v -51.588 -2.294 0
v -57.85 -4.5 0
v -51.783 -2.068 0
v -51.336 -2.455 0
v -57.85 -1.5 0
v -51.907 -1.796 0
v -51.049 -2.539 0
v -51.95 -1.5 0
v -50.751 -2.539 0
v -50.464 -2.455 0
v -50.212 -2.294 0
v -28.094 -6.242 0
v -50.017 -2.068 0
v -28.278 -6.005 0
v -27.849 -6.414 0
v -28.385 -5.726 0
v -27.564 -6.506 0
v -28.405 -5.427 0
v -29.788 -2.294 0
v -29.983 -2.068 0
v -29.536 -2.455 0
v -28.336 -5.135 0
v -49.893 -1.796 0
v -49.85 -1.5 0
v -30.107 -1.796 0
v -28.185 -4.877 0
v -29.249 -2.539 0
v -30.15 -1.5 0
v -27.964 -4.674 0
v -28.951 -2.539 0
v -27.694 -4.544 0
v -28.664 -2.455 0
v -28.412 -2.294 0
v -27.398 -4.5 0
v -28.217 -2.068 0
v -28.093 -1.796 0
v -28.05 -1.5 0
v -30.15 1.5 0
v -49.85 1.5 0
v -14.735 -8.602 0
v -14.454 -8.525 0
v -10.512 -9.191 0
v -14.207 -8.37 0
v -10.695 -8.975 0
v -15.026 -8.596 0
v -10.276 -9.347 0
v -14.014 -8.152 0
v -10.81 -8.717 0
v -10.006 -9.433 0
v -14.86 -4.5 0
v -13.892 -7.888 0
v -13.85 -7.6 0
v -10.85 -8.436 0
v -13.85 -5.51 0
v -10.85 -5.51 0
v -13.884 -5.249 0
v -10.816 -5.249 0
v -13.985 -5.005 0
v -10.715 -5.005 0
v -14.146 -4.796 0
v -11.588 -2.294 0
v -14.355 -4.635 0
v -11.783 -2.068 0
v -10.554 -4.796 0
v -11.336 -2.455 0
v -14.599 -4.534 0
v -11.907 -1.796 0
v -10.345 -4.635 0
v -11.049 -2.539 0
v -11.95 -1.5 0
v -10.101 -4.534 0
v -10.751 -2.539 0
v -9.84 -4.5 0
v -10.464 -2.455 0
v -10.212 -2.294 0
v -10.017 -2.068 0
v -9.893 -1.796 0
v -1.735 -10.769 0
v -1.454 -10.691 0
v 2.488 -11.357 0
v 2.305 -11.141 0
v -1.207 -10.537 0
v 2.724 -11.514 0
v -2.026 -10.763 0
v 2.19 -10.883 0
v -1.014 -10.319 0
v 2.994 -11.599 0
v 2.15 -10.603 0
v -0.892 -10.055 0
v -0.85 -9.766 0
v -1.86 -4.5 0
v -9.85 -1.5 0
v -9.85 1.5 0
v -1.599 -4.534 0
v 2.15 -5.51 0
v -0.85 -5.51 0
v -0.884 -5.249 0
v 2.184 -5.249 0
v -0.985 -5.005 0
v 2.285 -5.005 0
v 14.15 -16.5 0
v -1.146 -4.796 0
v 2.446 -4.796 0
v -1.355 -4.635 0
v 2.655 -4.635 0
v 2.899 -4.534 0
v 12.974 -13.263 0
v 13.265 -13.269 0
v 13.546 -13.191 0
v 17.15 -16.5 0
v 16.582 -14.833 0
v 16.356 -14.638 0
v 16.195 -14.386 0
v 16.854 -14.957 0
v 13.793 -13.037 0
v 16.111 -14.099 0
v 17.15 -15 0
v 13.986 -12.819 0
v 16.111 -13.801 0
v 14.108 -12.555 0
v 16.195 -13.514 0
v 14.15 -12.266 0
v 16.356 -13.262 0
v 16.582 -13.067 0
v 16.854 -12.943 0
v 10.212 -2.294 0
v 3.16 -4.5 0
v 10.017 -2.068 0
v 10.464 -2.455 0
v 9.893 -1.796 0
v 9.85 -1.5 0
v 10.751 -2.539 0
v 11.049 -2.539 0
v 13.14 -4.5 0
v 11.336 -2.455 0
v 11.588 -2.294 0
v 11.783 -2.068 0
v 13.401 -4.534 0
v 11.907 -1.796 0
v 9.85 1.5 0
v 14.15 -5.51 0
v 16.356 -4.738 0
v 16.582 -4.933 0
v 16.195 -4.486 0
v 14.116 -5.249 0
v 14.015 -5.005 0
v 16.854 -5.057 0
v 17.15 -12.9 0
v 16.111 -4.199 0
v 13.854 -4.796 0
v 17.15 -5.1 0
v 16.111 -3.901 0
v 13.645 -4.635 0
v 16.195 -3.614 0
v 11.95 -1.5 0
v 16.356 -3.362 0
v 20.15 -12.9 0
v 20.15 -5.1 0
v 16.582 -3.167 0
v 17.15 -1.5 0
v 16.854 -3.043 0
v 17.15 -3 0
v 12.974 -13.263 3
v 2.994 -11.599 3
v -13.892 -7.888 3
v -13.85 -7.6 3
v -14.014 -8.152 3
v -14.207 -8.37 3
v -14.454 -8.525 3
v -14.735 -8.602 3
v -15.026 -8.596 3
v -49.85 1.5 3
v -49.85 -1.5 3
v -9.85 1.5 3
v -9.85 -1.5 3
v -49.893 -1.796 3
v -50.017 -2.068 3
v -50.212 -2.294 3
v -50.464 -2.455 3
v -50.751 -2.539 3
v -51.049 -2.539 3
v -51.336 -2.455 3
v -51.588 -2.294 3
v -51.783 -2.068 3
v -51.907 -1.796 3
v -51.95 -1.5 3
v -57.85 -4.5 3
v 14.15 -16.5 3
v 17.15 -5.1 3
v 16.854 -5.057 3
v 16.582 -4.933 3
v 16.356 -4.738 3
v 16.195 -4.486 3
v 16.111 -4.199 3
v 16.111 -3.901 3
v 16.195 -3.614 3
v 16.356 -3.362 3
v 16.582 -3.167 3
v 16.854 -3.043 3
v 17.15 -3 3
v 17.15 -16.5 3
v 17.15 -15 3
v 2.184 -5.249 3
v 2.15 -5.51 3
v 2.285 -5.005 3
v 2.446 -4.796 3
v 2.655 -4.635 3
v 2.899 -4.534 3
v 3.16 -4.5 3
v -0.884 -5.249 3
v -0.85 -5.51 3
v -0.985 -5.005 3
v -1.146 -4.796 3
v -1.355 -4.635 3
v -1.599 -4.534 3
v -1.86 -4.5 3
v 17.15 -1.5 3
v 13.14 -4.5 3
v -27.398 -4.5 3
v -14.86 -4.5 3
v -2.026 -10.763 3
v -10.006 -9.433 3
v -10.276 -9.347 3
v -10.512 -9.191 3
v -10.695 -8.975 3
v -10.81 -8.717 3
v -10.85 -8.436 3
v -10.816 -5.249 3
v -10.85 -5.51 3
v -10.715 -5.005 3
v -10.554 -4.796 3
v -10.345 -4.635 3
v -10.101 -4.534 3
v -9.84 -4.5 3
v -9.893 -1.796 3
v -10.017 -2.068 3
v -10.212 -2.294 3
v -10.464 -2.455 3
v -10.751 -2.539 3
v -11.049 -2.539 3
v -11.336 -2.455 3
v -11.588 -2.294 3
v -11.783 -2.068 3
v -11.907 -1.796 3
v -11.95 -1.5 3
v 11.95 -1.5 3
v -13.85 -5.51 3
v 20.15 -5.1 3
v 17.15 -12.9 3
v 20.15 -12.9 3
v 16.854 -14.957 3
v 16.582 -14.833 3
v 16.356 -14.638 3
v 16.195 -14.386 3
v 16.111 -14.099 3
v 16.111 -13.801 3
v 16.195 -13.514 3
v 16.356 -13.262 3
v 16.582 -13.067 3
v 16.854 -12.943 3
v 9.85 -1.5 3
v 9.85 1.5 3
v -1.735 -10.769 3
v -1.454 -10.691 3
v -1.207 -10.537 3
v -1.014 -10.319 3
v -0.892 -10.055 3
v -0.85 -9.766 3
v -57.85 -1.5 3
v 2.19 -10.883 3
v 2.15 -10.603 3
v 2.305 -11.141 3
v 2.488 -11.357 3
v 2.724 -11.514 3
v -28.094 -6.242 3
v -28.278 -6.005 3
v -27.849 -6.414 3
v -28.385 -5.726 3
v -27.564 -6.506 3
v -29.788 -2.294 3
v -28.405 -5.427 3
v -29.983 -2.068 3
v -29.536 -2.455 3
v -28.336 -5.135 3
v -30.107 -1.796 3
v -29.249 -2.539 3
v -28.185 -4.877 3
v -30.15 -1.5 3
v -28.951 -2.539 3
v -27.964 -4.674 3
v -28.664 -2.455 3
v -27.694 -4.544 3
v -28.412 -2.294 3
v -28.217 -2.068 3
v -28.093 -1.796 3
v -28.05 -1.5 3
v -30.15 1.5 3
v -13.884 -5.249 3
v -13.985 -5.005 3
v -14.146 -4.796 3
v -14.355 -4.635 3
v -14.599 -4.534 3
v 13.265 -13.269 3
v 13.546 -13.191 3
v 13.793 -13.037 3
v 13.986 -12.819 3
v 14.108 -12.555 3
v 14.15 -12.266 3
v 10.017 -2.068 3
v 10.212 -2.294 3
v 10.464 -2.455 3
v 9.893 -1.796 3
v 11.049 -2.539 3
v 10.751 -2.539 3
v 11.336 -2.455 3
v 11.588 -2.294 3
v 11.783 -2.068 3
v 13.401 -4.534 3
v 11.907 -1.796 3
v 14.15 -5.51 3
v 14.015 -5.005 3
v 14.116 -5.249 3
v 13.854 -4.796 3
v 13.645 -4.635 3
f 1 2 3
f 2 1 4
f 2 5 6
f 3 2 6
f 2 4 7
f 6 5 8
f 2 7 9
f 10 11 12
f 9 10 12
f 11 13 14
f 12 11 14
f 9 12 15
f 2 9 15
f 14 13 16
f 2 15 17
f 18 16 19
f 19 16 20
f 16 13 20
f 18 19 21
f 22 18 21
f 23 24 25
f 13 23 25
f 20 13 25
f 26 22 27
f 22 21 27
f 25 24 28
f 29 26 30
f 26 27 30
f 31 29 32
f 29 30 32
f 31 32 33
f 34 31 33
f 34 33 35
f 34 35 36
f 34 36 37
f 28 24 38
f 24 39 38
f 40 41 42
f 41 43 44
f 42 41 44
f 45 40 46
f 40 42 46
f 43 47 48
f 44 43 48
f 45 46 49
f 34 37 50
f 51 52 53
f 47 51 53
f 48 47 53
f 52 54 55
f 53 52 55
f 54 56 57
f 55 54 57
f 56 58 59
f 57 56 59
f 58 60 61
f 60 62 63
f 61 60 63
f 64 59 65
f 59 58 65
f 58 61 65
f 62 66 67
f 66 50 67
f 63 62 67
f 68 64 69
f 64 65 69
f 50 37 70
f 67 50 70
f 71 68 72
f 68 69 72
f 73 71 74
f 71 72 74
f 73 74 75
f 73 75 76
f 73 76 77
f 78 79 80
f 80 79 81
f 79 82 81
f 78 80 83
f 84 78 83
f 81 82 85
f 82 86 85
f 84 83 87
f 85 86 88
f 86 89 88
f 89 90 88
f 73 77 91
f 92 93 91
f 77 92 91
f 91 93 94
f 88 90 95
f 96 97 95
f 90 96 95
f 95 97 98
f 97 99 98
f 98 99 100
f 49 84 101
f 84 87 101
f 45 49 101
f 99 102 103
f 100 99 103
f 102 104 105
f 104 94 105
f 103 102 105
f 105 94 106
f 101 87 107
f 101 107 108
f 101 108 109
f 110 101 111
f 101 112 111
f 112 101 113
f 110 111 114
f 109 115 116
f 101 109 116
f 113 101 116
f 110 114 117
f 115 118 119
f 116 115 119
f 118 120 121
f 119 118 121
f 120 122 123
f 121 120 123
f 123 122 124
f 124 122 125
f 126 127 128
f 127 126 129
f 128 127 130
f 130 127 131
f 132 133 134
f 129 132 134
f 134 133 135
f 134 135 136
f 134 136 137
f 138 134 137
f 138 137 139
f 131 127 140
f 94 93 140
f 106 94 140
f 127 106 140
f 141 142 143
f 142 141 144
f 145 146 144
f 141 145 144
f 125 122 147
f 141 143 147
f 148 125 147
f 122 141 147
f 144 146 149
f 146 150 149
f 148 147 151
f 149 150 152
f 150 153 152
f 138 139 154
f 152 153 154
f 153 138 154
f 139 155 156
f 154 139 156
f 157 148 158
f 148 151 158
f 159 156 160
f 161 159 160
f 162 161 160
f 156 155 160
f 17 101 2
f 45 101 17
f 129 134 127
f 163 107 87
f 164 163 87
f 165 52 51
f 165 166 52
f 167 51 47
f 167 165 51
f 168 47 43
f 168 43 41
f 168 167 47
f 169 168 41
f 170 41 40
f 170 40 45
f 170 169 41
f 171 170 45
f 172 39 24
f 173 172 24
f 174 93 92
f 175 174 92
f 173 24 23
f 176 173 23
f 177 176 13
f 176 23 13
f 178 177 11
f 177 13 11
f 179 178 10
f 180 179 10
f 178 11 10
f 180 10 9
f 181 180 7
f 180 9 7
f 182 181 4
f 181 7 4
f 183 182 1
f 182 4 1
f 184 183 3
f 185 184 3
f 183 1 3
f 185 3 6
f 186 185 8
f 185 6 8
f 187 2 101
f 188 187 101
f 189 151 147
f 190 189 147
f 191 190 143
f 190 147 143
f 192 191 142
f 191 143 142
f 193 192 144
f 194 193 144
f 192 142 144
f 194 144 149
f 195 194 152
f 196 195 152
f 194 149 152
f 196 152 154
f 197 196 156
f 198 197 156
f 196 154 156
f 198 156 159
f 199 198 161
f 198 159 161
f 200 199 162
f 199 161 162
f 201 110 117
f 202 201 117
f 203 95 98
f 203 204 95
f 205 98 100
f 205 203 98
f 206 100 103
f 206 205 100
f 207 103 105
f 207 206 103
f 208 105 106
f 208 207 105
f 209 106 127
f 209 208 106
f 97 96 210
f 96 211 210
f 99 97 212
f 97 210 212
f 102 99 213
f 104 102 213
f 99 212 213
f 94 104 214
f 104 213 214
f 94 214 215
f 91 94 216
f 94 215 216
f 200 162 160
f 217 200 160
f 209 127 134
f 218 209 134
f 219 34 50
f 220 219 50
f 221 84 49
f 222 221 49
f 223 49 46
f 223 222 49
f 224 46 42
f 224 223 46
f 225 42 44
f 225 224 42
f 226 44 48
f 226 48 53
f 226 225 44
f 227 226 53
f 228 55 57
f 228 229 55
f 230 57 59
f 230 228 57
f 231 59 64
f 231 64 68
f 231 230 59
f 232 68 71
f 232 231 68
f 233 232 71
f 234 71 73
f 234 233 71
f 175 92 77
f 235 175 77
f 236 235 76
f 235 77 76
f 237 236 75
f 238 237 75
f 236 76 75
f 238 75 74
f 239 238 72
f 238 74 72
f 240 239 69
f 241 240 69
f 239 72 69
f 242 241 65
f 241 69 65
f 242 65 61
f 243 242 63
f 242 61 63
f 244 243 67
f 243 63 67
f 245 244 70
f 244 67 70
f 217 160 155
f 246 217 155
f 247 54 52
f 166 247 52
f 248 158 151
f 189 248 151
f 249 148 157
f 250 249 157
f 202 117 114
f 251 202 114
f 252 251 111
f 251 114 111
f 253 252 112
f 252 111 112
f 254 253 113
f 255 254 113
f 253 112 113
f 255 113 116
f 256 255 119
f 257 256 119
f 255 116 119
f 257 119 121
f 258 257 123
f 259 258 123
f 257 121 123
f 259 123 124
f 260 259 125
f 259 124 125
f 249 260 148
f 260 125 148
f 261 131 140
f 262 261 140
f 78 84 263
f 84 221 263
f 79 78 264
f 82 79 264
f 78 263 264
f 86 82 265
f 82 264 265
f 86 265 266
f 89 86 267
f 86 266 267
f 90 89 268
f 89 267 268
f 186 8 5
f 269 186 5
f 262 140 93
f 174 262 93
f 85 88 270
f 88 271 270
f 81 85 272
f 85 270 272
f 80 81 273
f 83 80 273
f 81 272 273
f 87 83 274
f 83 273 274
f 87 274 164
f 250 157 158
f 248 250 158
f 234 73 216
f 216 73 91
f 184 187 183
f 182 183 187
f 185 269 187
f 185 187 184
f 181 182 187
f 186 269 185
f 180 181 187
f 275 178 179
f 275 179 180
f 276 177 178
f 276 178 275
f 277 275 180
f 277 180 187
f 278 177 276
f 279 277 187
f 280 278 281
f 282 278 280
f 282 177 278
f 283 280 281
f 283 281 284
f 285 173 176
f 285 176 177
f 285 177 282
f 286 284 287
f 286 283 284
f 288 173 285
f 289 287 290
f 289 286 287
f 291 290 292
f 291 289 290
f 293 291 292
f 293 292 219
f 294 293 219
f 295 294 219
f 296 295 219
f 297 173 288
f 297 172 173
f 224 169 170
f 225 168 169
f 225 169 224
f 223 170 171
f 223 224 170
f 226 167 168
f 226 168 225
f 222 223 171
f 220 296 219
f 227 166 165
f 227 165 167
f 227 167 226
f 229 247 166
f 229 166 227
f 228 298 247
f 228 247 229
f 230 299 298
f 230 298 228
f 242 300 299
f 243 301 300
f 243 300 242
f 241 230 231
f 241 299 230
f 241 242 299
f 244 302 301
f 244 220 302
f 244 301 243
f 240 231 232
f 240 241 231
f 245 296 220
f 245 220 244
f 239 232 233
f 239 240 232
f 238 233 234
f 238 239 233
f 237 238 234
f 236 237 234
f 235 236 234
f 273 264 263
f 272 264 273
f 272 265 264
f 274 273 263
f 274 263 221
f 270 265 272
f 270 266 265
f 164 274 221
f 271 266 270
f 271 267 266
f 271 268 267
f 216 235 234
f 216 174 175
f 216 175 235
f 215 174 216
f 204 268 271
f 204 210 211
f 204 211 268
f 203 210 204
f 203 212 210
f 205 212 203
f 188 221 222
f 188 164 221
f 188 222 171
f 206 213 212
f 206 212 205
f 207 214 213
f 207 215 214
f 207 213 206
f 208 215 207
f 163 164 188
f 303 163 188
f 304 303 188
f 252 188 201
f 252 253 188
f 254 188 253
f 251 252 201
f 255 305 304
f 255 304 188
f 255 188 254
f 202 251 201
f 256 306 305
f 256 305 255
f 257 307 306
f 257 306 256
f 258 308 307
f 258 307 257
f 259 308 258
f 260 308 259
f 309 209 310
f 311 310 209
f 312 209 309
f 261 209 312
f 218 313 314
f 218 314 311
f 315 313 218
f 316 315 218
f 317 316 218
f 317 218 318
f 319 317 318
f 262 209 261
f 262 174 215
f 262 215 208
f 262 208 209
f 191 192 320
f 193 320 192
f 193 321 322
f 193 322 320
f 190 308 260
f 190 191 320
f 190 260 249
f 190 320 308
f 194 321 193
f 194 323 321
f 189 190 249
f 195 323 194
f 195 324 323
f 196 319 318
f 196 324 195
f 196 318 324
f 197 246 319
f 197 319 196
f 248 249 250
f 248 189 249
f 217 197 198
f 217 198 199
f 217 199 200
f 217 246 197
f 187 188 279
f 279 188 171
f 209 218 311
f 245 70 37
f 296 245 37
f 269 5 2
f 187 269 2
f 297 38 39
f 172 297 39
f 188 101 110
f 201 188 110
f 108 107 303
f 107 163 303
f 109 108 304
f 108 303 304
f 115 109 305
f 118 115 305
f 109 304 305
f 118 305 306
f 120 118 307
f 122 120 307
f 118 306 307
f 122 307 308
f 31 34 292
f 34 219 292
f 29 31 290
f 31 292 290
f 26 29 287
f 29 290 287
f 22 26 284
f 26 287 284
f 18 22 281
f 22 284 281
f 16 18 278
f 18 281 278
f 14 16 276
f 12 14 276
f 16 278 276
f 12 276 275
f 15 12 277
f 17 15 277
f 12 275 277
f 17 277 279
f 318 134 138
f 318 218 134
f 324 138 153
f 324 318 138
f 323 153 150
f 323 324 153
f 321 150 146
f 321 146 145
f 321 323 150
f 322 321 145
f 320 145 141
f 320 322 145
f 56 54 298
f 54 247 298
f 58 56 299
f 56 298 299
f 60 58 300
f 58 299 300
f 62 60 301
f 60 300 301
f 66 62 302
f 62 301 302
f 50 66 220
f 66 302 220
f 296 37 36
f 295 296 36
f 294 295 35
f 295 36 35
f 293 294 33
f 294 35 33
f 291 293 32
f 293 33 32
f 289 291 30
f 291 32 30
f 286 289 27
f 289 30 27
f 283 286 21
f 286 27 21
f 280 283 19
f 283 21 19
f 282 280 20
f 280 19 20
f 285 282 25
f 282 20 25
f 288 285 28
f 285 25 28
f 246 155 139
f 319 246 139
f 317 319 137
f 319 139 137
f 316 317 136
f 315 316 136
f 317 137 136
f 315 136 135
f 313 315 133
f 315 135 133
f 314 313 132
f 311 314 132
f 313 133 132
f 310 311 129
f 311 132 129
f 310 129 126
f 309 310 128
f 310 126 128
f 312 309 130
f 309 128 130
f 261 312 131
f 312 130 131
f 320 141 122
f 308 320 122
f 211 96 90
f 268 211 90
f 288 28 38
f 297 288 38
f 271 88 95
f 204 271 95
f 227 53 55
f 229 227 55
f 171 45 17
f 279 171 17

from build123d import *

# Parameters (mm, degrees)
EXTRUDE_1_DEPTH = 3
FILLET_1_R      = 1.01


with BuildPart() as part:
    # 草图1 → 凸台-拉伸1 (new body)
    with BuildSketch(Plane.XY):
        with BuildLine():
            Line((-11.95, -1.5), (-28.05, -1.5))
            ThreePointArc((-28.05, -1.5), (-29.1, -2.55), (-30.15, -1.5))
            Line((-30.15, -1.5), (-30.15, 1.5))
            Line((-30.15, 1.5), (-49.85, 1.5))
            Line((-49.85, 1.5), (-49.85, -1.5))
            ThreePointArc((-49.85, -1.5), (-50.9, -2.55), (-51.95, -1.5))
            Line((-51.95, -1.5), (-57.85, -1.5))
            Line((-57.85, -1.5), (-57.85, -4.5))
            Line((-57.85, -4.5), (14.15, -16.5))
            Line((14.15, -16.5), (17.15, -16.5))
            Line((17.15, -16.5), (17.15, -15))
            ThreePointArc((17.15, -15), (16.1, -13.95), (17.15, -12.9))
            Line((17.15, -12.9), (20.15, -12.9))
            Line((20.15, -12.9), (20.15, -5.1))
            Line((20.15, -5.1), (17.15, -5.1))
            ThreePointArc((17.15, -5.1), (16.1, -4.05), (17.15, -3))
            Line((17.15, -3), (17.15, -1.5))
            Line((17.15, -1.5), (11.95, -1.5))
            ThreePointArc((11.95, -1.5), (10.9, -2.55), (9.85, -1.5))
            Line((9.85, -1.5), (9.85, 1.5))
            Line((9.85, 1.5), (-9.85, 1.5))
            Line((-9.85, 1.5), (-9.85, -1.5))
            ThreePointArc((-9.85, -1.5), (-10.9, -2.55), (-11.95, -1.5))
        make_face()
        Polygon((-10.85, -9.291952068), (-10.85, -4.5), (-0.85, -4.5), (-0.85, -10.958618735), align=None, mode=Mode.SUBTRACT)
        Polygon((2.15, -4.5), (14.15, -4.5), (14.15, -13.458618735), (2.15, -11.458618735), align=None, mode=Mode.SUBTRACT)
        Polygon((-13.85, -8.791952068), (-39.601712409, -4.5), (-13.85, -4.5), align=None, mode=Mode.SUBTRACT)
    extrude(amount=EXTRUDE_1_DEPTH)

    # 圆角1
    fillet_1_edges = [part.edges().sort_by_distance(p)[0] for p in [
        (-0.85, -4.5, 1.5),
        (-10.85, -4.5, 1.5),
        (-10.85, -9.291952068, 1.5),
        (-0.85, -10.958618735, 1.5),
        (2.15, -11.458618735, 1.5),
        (14.15, -13.458618735, 1.5),
        (14.15, -4.5, 1.5),
        (2.15, -4.5, 1.5),
        (-13.85, -4.5, 1.5),
        (-39.601712409, -4.5, 1.5),
        (-13.85, -8.791952068, 1.5),
    ]]
    fillet(fillet_1_edges, radius=FILLET_1_R)


solid = part.part
